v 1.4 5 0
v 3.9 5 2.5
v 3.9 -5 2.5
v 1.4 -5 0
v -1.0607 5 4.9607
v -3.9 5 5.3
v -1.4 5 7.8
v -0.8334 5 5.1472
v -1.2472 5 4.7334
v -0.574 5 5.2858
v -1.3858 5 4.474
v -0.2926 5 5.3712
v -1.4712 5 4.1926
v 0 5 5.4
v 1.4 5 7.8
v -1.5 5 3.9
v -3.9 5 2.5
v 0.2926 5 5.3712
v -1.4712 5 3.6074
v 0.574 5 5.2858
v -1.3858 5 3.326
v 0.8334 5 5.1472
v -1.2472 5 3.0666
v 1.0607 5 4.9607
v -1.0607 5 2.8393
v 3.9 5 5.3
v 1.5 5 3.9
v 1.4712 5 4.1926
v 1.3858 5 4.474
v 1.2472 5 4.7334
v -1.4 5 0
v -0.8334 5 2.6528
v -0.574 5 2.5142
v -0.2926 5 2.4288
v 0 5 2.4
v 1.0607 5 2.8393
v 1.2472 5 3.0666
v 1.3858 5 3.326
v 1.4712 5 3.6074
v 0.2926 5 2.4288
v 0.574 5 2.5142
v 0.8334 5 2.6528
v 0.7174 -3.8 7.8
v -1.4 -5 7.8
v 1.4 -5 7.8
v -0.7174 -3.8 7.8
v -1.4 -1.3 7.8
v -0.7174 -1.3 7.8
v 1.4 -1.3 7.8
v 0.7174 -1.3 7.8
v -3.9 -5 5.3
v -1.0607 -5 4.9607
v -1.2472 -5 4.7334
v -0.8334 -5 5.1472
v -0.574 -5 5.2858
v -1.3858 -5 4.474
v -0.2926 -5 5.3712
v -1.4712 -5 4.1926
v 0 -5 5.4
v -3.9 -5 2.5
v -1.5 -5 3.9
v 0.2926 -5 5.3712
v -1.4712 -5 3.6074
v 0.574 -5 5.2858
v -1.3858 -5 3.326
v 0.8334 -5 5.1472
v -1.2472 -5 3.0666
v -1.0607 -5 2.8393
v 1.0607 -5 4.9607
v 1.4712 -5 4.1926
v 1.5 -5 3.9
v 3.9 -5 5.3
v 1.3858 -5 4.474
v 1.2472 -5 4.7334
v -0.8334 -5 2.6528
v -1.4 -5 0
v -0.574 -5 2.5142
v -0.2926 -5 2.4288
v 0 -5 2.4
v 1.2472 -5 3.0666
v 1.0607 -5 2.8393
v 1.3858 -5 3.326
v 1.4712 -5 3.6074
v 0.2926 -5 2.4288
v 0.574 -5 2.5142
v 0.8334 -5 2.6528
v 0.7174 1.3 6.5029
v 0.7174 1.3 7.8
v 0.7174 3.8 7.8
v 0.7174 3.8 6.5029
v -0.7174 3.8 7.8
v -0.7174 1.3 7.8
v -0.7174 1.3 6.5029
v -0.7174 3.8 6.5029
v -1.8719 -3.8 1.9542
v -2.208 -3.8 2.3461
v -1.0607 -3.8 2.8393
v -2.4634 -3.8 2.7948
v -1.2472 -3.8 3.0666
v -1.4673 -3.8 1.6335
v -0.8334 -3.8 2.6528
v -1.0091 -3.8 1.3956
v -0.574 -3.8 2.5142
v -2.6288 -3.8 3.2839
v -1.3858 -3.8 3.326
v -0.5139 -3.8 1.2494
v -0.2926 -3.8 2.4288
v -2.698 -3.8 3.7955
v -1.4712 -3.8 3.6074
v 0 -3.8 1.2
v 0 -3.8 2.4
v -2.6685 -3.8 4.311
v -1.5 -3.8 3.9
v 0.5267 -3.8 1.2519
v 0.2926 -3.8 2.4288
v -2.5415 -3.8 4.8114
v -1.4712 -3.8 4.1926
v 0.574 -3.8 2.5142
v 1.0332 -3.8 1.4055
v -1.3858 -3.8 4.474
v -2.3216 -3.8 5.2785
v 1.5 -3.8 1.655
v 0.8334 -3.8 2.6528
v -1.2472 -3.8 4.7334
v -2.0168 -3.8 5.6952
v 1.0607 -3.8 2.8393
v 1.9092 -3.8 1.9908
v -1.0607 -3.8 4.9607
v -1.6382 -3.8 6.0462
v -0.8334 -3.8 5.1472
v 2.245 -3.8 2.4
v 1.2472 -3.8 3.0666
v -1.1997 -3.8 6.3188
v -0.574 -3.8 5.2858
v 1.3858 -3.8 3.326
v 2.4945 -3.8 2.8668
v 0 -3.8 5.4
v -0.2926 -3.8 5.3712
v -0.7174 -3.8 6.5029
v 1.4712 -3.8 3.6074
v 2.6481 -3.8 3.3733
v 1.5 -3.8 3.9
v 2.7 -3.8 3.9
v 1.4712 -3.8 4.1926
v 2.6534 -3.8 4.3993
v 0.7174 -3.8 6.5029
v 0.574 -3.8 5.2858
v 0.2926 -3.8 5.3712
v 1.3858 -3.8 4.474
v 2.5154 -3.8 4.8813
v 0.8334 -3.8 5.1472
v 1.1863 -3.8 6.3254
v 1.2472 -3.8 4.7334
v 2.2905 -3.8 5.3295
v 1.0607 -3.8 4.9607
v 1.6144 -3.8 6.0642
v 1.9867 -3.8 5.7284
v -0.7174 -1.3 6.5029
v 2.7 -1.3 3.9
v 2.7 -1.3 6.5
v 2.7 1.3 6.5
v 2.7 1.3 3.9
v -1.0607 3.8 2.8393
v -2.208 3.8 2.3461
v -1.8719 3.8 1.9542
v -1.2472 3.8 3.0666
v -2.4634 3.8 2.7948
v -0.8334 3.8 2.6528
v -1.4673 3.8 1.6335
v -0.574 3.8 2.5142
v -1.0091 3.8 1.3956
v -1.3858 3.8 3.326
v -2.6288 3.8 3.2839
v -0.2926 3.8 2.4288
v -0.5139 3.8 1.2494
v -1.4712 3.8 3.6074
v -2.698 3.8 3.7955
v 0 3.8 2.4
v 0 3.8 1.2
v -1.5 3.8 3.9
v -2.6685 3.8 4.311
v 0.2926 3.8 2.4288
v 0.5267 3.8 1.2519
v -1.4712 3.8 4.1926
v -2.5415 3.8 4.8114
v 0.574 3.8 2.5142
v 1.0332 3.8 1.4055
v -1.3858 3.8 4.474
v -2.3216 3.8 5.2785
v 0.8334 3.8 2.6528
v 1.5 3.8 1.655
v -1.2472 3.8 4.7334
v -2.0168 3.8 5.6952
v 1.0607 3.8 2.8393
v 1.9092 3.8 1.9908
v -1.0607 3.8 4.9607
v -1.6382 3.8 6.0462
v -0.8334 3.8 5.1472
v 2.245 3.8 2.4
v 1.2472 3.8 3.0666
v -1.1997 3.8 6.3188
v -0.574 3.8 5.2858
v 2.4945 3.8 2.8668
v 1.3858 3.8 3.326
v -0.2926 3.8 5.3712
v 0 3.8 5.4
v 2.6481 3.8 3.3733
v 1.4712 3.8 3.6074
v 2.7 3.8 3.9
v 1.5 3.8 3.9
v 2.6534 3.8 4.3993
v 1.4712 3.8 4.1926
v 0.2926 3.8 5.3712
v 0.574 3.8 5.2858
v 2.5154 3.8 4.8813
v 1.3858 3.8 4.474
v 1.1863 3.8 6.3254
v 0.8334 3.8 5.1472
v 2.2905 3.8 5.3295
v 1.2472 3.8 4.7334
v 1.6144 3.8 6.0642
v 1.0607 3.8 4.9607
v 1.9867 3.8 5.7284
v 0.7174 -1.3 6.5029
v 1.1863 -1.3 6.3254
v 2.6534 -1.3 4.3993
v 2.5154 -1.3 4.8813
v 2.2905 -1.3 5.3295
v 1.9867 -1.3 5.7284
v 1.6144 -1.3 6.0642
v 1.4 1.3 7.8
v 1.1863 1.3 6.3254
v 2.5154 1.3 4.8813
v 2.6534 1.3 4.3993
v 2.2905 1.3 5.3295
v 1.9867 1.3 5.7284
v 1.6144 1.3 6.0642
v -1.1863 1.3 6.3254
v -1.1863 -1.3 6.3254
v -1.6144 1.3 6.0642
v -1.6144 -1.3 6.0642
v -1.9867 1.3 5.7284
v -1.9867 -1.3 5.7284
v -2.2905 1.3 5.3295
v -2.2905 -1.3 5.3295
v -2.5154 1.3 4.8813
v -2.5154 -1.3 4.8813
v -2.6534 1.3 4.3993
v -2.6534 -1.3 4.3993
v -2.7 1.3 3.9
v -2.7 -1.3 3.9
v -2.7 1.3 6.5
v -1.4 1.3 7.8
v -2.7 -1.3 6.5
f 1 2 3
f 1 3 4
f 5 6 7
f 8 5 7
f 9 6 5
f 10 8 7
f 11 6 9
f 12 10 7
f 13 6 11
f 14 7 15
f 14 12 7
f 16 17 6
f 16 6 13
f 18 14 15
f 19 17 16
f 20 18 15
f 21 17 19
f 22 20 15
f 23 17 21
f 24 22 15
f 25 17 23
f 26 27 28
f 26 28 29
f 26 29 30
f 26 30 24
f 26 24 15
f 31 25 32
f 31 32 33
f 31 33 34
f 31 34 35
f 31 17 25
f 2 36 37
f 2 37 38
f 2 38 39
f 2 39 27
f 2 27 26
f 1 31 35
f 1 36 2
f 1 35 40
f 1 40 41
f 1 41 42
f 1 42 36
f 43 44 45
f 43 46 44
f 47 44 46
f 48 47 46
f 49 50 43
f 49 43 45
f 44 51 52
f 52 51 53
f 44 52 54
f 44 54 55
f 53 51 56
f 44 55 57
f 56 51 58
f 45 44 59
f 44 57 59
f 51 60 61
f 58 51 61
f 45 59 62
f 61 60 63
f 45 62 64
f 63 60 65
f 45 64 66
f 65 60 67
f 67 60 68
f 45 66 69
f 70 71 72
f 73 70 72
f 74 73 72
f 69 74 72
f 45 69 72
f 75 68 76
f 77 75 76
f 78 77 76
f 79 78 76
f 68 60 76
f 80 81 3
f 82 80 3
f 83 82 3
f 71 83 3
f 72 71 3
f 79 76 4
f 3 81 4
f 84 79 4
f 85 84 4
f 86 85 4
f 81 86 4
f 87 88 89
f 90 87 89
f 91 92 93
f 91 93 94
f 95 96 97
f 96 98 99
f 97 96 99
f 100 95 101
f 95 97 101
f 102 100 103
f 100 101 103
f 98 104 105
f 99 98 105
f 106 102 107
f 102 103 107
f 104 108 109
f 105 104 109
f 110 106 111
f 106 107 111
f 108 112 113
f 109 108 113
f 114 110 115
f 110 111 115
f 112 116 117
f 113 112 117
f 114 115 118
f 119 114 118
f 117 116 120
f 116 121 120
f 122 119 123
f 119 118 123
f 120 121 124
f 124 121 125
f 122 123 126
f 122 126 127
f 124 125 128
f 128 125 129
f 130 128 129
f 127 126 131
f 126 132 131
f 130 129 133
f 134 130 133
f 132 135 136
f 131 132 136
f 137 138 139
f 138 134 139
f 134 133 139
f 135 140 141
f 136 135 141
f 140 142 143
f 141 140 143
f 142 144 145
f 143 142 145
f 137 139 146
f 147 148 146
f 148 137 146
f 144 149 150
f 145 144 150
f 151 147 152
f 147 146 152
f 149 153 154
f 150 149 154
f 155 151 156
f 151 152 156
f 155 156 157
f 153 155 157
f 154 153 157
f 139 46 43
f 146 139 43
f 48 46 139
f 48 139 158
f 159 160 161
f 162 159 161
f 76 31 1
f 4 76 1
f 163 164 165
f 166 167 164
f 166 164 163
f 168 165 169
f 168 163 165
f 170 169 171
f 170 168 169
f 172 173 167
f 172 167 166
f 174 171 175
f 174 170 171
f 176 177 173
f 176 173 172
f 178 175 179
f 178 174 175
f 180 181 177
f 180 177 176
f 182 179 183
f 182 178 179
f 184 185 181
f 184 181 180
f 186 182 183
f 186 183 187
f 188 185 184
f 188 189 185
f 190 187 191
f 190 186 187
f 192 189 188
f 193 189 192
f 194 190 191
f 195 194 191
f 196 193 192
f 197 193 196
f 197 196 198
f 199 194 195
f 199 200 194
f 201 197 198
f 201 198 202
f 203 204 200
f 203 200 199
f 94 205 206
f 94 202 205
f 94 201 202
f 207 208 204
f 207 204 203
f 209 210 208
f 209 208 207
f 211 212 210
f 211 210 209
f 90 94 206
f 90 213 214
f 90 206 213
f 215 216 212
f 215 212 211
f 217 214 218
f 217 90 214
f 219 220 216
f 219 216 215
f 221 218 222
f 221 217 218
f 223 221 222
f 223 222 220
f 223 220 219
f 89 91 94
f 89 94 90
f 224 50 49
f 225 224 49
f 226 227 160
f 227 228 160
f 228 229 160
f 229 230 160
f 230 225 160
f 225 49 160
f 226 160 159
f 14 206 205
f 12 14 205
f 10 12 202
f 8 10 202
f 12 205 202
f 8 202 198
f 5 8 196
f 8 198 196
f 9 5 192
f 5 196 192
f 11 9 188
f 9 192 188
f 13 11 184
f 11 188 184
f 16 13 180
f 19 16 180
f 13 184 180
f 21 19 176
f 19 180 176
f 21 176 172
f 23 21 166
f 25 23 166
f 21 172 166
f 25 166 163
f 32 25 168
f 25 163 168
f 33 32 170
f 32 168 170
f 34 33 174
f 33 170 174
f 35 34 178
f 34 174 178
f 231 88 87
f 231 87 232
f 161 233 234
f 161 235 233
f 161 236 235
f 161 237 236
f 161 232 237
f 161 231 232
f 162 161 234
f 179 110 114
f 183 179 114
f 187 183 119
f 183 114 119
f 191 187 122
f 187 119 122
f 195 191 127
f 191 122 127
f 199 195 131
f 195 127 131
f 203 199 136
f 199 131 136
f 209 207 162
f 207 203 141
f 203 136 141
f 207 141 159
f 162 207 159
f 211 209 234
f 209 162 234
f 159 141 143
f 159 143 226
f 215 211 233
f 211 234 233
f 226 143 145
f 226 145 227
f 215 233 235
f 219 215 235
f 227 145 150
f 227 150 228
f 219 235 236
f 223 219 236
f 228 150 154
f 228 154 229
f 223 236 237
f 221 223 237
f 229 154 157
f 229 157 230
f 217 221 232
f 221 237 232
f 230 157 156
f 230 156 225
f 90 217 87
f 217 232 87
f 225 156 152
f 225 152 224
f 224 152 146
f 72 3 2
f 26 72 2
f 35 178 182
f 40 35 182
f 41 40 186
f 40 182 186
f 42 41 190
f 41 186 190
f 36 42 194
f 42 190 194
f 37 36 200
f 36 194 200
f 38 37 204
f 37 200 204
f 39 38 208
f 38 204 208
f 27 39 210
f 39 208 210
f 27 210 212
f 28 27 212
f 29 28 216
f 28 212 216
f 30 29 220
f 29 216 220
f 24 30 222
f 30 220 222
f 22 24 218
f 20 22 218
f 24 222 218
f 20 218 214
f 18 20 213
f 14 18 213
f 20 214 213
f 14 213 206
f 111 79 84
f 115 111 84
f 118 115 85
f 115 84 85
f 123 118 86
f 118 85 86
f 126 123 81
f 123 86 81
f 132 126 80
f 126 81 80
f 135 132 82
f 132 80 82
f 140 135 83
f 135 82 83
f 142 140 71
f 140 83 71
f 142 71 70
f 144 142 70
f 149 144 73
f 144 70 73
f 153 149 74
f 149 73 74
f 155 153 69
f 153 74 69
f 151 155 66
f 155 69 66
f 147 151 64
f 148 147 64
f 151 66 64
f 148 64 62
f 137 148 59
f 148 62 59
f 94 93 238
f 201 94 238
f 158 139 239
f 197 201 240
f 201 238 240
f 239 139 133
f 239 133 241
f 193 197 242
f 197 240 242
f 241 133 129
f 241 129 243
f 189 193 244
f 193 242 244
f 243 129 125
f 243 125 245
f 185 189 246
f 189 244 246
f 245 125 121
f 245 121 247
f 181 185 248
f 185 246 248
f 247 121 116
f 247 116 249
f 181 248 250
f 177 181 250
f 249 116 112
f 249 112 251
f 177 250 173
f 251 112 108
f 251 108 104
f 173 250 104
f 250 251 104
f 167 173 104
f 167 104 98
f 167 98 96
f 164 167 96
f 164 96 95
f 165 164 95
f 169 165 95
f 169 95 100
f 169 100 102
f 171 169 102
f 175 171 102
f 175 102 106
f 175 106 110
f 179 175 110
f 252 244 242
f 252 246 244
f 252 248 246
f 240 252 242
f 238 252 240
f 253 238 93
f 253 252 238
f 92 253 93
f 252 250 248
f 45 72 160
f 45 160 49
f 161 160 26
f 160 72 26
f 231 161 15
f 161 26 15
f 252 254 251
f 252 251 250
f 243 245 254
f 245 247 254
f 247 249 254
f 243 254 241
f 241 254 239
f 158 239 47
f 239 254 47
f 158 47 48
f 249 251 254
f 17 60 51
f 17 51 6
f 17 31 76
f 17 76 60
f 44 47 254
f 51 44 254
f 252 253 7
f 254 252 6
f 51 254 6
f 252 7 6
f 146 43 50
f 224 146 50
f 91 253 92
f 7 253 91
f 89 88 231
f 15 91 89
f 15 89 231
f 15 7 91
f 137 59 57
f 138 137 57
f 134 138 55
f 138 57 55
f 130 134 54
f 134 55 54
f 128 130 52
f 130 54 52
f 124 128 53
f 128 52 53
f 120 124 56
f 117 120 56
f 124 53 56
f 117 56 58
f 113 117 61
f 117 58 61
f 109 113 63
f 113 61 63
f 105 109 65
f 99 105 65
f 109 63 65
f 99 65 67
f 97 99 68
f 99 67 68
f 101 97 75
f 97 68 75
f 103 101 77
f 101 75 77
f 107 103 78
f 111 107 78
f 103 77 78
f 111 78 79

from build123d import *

# Parameters (mm, degrees)
F3_W          = 7.8
F3_H          = 10
F3_W_2        = 5.4
F3_H_2        = 2.6
F4_DEPTH      = 7.8
F7_DEPTH      = 3.8
F7_DEPTH_BACK = 3.8
F8_W          = 5.4
F8_H          = 2.6
F9_DEPTH      = 3.9
F10_W         = 1.4347932888
F10_H         = 7.6
F11_DEPTH     = 3.9
F13_DEPTH     = 10.001
F14_T1_DEPTH  = 22.8584149398


# Not quite as in the source:
# - a fillet or chamfer that OpenCascade refuses, or shapes differently, is made with other operations: its cross-section is extruded or revolved along the edge and cut away or added


with BuildPart() as f4:
    # F3 (on Top) → F4 (new body)
    with BuildSketch(Plane.XY):
        Rectangle(F3_W, F3_H)
        Rectangle(F3_W_2, F3_H_2, mode=Mode.SUBTRACT)
        Rectangle(F3_W_2, F3_H_2)
    extrude(amount=F4_DEPTH)

    # F6 (on offset) → F7 (cut, two sides)
    with BuildSketch(Plane.XZ) as f7_sk:
        with BuildLine():
            ThreePointArc((0, 1.2), (1.9091883092, 1.9908116908), (2.7, 3.9))
            ThreePointArc((2.7, 3.9), (1.9091883092, 5.8091883092), (0, 6.6))
            Line((0, 6.6), (0, 3.9))
            Line((0, 3.9), (0, 1.2))
        make_face()
        with BuildLine():
            Line((0, 3.9), (0, 6.6))
            ThreePointArc((0, 6.6), (-2.7, 3.9), (0, 1.2))
            Line((0, 1.2), (0, 3.9))
        make_face()
    extrude(amount=-F7_DEPTH, mode=Mode.SUBTRACT)
    extrude(f7_sk.sketch, amount=F7_DEPTH_BACK, mode=Mode.SUBTRACT)

    # F8 (on face) → F9 (cut)
    with BuildSketch(Plane.XY.offset(7.8)):
        Rectangle(F8_W, F8_H)
    extrude(amount=-F9_DEPTH, mode=Mode.SUBTRACT)

    # F10 (on face) → F11 (cut)
    with BuildSketch(Plane.XY.offset(7.8)):
        Rectangle(F10_W, F10_H)
    extrude(amount=-F11_DEPTH, mode=Mode.SUBTRACT)

    # F12 (on face) → F13 (cut, through all)
    with BuildSketch(Plane.XZ.offset(5)):
        with BuildLine():
            ThreePointArc((0, 2.4), (1.0606601718, 2.8393398282), (1.5, 3.9))
            ThreePointArc((1.5, 3.9), (1.0606601718, 4.9606601718), (0, 5.4))
            Line((0, 5.4), (0, 3.9))
            Line((0, 3.9), (0, 2.4))
        make_face()
        with BuildLine():
            Line((0, 3.9), (0, 5.4))
            ThreePointArc((0, 5.4), (-1.5, 3.9), (0, 2.4))
            Line((0, 2.4), (0, 3.9))
        make_face()
    extrude(amount=-F13_DEPTH, mode=Mode.SUBTRACT)

    # F14: chamfer of 2.5 on 4 edges, made by hand

    # F14_s2 → F14_t1 (cut)
    with BuildSketch(Plane.XZ.offset(-11.4292074699)):
        Polygon((-1.4, 7.8), (-3.9, 5.3), (-3.9, 7.8), align=None)
        Polygon((-1.4, 0), (-3.9, 2.5), (-3.9, 0), align=None)
        Polygon((3.9, 2.5), (1.4, 0), (3.9, 0), align=None)
        Polygon((3.9, 5.3), (1.4, 7.8), (3.9, 7.8), align=None)
    extrude(amount=F14_T1_DEPTH, mode=Mode.SUBTRACT)


solid = f4.part
